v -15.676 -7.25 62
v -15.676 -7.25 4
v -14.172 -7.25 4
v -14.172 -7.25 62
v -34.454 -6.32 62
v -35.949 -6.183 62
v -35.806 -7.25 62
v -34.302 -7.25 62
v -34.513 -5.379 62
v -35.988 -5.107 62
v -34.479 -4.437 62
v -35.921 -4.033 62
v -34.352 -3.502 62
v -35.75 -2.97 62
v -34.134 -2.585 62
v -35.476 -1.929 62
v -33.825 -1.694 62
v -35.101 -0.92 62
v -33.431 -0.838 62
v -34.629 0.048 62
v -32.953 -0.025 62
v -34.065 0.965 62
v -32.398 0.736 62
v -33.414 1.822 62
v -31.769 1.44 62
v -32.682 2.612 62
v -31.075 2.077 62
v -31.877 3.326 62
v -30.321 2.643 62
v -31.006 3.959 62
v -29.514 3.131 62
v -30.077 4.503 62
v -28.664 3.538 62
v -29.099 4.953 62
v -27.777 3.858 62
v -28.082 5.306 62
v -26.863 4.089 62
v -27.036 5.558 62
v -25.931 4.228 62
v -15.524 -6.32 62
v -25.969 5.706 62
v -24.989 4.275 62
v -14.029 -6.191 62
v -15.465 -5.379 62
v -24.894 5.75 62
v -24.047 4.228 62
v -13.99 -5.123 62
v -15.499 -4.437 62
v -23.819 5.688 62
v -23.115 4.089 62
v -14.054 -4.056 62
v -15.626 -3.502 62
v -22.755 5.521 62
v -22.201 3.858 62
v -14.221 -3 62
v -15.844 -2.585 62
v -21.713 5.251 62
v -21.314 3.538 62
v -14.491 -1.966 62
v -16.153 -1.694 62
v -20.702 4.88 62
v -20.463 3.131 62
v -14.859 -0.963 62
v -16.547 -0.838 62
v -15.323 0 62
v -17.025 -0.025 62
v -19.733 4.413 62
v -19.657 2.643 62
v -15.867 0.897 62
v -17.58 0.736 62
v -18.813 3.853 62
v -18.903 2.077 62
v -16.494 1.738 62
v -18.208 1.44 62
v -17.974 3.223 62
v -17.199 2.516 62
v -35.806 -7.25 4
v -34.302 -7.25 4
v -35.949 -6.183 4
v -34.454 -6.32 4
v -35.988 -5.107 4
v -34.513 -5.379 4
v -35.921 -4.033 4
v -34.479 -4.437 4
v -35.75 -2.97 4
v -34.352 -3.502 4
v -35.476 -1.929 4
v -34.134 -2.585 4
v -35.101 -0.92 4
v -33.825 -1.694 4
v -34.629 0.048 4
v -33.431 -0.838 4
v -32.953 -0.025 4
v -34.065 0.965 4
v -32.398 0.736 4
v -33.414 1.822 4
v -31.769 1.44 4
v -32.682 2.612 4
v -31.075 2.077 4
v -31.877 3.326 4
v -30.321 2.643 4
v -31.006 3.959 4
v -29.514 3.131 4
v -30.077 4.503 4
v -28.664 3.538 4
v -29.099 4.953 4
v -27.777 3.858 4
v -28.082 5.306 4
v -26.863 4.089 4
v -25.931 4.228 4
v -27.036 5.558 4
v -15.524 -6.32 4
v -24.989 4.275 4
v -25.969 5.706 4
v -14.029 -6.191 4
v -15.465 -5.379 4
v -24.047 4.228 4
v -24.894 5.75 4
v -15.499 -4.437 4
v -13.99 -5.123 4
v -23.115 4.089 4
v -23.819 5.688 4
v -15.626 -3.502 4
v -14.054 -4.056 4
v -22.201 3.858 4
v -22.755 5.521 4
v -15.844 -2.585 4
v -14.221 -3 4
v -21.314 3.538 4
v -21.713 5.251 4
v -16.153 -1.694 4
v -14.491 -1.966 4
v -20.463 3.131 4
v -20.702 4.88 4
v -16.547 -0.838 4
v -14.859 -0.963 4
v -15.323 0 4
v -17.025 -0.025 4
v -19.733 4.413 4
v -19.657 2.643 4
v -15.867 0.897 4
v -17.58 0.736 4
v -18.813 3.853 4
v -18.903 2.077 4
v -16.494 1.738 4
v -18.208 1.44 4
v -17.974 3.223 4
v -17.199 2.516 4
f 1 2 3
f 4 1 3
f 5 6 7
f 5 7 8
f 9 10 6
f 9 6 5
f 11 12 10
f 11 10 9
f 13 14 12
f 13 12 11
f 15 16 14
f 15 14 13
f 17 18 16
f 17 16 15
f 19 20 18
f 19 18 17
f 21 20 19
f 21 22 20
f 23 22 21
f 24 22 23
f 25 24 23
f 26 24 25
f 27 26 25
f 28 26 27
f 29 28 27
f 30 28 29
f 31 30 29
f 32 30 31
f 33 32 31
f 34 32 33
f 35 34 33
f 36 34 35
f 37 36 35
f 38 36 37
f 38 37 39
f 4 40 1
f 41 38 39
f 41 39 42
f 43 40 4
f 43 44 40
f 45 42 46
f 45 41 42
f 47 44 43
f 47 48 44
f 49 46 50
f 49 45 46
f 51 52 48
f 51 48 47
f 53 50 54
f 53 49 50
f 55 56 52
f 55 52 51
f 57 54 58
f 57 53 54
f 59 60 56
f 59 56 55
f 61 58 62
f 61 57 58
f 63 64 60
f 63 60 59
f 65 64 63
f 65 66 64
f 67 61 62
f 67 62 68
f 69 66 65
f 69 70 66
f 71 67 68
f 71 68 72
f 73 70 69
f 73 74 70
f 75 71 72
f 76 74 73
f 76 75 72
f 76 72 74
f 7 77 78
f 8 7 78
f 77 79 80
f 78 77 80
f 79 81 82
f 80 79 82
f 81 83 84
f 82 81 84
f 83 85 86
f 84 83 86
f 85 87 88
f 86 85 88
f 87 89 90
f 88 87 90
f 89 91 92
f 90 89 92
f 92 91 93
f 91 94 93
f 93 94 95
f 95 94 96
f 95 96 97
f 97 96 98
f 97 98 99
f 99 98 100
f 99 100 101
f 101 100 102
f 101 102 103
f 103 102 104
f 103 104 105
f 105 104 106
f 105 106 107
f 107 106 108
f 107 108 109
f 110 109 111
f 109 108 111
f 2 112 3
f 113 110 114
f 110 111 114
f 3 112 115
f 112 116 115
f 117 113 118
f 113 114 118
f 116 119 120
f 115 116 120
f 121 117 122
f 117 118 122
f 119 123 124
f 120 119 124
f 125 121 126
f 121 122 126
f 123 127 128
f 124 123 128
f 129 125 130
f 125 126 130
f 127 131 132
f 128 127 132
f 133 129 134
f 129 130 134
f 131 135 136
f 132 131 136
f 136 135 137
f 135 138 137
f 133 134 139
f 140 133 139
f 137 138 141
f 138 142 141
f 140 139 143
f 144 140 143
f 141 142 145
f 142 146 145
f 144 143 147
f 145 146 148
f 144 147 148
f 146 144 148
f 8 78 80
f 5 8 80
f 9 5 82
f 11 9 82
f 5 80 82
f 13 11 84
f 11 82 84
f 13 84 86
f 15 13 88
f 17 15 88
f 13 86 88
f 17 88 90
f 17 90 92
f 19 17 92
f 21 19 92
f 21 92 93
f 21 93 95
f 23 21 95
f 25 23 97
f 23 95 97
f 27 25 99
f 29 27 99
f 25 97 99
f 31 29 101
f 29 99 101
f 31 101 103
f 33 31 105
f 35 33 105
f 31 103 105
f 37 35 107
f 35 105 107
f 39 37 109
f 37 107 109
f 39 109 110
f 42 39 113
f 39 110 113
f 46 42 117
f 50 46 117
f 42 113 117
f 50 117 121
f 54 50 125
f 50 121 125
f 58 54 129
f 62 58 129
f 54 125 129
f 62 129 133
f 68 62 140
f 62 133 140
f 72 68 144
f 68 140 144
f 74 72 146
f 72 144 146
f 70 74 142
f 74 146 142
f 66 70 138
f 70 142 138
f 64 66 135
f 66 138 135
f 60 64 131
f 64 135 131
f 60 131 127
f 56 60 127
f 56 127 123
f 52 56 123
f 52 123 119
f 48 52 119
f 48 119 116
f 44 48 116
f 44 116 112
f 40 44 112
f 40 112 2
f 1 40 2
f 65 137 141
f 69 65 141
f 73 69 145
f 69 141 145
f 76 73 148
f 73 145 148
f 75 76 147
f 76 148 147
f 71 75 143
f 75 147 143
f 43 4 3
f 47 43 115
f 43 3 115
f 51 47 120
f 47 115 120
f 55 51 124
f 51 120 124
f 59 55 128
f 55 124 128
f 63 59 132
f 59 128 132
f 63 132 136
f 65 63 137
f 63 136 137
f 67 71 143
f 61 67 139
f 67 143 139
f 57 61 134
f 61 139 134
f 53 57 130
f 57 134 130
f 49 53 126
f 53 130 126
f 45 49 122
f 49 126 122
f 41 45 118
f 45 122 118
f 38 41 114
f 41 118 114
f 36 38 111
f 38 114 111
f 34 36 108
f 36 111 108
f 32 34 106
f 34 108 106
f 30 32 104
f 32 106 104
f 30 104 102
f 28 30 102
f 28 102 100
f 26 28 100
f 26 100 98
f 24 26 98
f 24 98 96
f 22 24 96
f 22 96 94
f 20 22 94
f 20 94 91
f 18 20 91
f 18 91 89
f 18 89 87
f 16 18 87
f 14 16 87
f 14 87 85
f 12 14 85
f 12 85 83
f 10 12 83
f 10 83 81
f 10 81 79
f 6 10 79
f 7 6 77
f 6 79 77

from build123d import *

# Parameters (mm, degrees)
F0_R     = 1
F1_DEPTH = 2
F3_DEPTH = 2
F5_DEPTH = 60
F6_W     = 84.123355
F6_H     = 40.454367
F7_DEPTH = 4


with BuildPart() as f1:
    # F0 (on Top) → F1 (new body)
    with BuildSketch(Plane.XY):
        with BuildLine():
            Line((-3.751696, 3.78006), (-3.109909, 2.896716))
            ThreePointArc((-3.109909, 2.896716), (-3.438322, 2.498087), (-3.715956, 2.062565))
            Line((-3.715956, 2.062565), (-4.754388, 2.399972))
            Line((-4.754388, 2.399972), (-5.817595, 2.320708))
            Line((-5.817595, 2.320708), (-6.070611, 1.542005))
            Line((-6.070611, 1.542005), (-5.257049, 0.852941))
            Line((-5.257049, 0.852941), (-4.218616, 0.515534))
            ThreePointArc((-4.218616, 0.515534), (-4.25, 0), (-4.218616, -0.515534))
            Line((-4.218616, -0.515534), (-5.257049, -0.852941))
            Line((-5.257049, -0.852941), (-6.070611, -1.542005))
            Line((-6.070611, -1.542005), (-5.817595, -2.320708))
            Line((-5.817595, -2.320708), (-4.754388, -2.399972))
            Line((-4.754388, -2.399972), (-3.715956, -2.062565))
            ThreePointArc((-3.715956, -2.062565), (-3.438322, -2.498087), (-3.109909, -2.896716))
            Line((-3.109909, -2.896716), (-3.751696, -3.78006))
            Line((-3.751696, -3.78006), (-4.00486, -4.815724))
            Line((-4.00486, -4.815724), (-3.342456, -5.296989))
            Line((-3.342456, -5.296989), (-2.435713, -4.736177))
            Line((-2.435713, -4.736177), (-1.793926, -3.852834))
            ThreePointArc((-1.793926, -3.852834), (-1.313322, -4.04199), (-0.813322, -4.171451))
            Line((-0.813322, -4.171451), (-0.813322, -5.263324))
            Line((-0.813322, -5.263324), (-0.409388, -6.25))
            Line((-0.409388, -6.25), (0.409388, -6.25))
            Line((0.409388, -6.25), (0.813322, -5.263324))
            Line((0.813322, -5.263324), (0.813322, -4.171451))
            ThreePointArc((0.813322, -4.171451), (1.313322, -4.04199), (1.793926, -3.852834))
            Line((1.793926, -3.852834), (2.435713, -4.736177))
            Line((2.435713, -4.736177), (3.342456, -5.296989))
            Line((3.342456, -5.296989), (4.00486, -4.815724))
            Line((4.00486, -4.815724), (3.751696, -3.78006))
            Line((3.751696, -3.78006), (3.109909, -2.896716))
            ThreePointArc((3.109909, -2.896716), (3.438322, -2.498087), (3.715956, -2.062565))
            Line((3.715956, -2.062565), (4.754388, -2.399972))
            Line((4.754388, -2.399972), (5.817595, -2.320708))
            Line((5.817595, -2.320708), (6.070611, -1.542005))
            Line((6.070611, -1.542005), (5.257049, -0.852941))
            Line((5.257049, -0.852941), (4.218616, -0.515534))
            ThreePointArc((4.218616, -0.515534), (4.25, 0), (4.218616, 0.515534))
            Line((4.218616, 0.515534), (5.257049, 0.852941))
            Line((5.257049, 0.852941), (6.070611, 1.542005))
            Line((6.070611, 1.542005), (5.817595, 2.320708))
            Line((5.817595, 2.320708), (4.754388, 2.399972))
            Line((4.754388, 2.399972), (3.715956, 2.062565))
            ThreePointArc((3.715956, 2.062565), (3.438322, 2.498087), (3.109909, 2.896716))
            Line((3.109909, 2.896716), (3.751696, 3.78006))
            Line((3.751696, 3.78006), (4.00486, 4.815724))
            Line((4.00486, 4.815724), (3.342456, 5.296989))
            Line((3.342456, 5.296989), (2.435713, 4.736177))
            Line((2.435713, 4.736177), (1.793926, 3.852834))
            ThreePointArc((1.793926, 3.852834), (1.313322, 4.04199), (0.813322, 4.171451))
            Line((0.813322, 4.171451), (0.813322, 5.263324))
            Line((0.813322, 5.263324), (0.409388, 6.25))
            Line((0.409388, 6.25), (-0.409388, 6.25))
            Line((-0.409388, 6.25), (-0.813322, 5.263324))
            Line((-0.813322, 5.263324), (-0.813322, 4.171451))
            ThreePointArc((-0.813322, 4.171451), (-1.313322, 4.04199), (-1.793926, 3.852834))
            Line((-1.793926, 3.852834), (-2.435713, 4.736177))
            Line((-2.435713, 4.736177), (-3.342456, 5.296989))
            Line((-3.342456, 5.296989), (-4.00486, 4.815724))
            Line((-4.00486, 4.815724), (-3.751696, 3.78006))
        make_face()
        Circle(F0_R, mode=Mode.SUBTRACT)
    extrude(amount=F1_DEPTH)

    # F2 (on face) → F3 (join)
    with BuildSketch(Plane.XY.offset(2)):
        with BuildLine():
            ThreePointArc((-34.301606, -7.25), (-24.988946, 4.275), (-15.676287, -7.25))
            Line((-15.676287, -7.25), (-14.172292, -7.25))
            ThreePointArc((-14.172292, -7.25), (-14.124852, -3.526211), (-15.322639, 0))
            Line((-15.322639, 0), (-5.88111, 2.12523))
            Line((-5.88111, 2.12523), (-5.817595, 2.320708))
            Line((-5.817595, 2.320708), (-4.754388, 2.399972))
            Line((-4.754388, 2.399972), (-4.715983, 2.387493))
            Line((-4.715983, 2.387493), (-3.27176, 2.712579))
            ThreePointArc((-3.27176, 2.712579), (-3.192163, 2.805815), (-3.109909, 2.896716))
            Line((-3.109909, 2.896716), (-3.751696, 3.78006))
            Line((-3.751696, 3.78006), (-4.00486, 4.815724))
            Line((-4.00486, 4.815724), (-3.342456, 5.296989))
            Line((-3.342456, 5.296989), (-2.435713, 4.736177))
            Line((-2.435713, 4.736177), (-1.793926, 3.852834))
            ThreePointArc((-1.793926, 3.852834), (-1.313322, 4.04199), (-0.813322, 4.171451))
            Line((-0.813322, 4.171451), (-0.813322, 5.263324))
            Line((-0.813322, 5.263324), (-0.453438, 6.142401))
            Line((-0.453438, 6.142401), (-18.813315, 3.852834))
            ThreePointArc((-18.813315, 3.852834), (-31.005839, 3.958528), (-35.8056, -7.25))
            Line((-35.8056, -7.25), (-34.301606, -7.25))
        make_face()
    extrude(amount=-F3_DEPTH)

    # F4 (on face) → F5 (join)
    with BuildSketch(Plane.XY.offset(2)):
        with BuildLine():
            Line((-15.676287, -7.25), (-14.172292, -7.25))
            ThreePointArc((-14.172292, -7.25), (-14.124852, -3.526211), (-15.322639, 0))
            ThreePointArc((-15.322639, 0), (-16.837085, 2.135605), (-18.813315, 3.852834))
            ThreePointArc((-18.813315, 3.852834), (-31.005839, 3.958528), (-35.8056, -7.25))
            Line((-35.8056, -7.25), (-34.301606, -7.25))
            ThreePointArc((-34.301606, -7.25), (-24.988946, 4.275), (-15.676287, -7.25))
        make_face()
    extrude(amount=F5_DEPTH)

    # F6 (on Top) → F7 (cut)
    with BuildSketch(Plane.XY):
        with Locations((-13.661468, 5.350011)):
            Rectangle(F6_W, F6_H)
    extrude(amount=F7_DEPTH, mode=Mode.SUBTRACT)


solid = f1.part
